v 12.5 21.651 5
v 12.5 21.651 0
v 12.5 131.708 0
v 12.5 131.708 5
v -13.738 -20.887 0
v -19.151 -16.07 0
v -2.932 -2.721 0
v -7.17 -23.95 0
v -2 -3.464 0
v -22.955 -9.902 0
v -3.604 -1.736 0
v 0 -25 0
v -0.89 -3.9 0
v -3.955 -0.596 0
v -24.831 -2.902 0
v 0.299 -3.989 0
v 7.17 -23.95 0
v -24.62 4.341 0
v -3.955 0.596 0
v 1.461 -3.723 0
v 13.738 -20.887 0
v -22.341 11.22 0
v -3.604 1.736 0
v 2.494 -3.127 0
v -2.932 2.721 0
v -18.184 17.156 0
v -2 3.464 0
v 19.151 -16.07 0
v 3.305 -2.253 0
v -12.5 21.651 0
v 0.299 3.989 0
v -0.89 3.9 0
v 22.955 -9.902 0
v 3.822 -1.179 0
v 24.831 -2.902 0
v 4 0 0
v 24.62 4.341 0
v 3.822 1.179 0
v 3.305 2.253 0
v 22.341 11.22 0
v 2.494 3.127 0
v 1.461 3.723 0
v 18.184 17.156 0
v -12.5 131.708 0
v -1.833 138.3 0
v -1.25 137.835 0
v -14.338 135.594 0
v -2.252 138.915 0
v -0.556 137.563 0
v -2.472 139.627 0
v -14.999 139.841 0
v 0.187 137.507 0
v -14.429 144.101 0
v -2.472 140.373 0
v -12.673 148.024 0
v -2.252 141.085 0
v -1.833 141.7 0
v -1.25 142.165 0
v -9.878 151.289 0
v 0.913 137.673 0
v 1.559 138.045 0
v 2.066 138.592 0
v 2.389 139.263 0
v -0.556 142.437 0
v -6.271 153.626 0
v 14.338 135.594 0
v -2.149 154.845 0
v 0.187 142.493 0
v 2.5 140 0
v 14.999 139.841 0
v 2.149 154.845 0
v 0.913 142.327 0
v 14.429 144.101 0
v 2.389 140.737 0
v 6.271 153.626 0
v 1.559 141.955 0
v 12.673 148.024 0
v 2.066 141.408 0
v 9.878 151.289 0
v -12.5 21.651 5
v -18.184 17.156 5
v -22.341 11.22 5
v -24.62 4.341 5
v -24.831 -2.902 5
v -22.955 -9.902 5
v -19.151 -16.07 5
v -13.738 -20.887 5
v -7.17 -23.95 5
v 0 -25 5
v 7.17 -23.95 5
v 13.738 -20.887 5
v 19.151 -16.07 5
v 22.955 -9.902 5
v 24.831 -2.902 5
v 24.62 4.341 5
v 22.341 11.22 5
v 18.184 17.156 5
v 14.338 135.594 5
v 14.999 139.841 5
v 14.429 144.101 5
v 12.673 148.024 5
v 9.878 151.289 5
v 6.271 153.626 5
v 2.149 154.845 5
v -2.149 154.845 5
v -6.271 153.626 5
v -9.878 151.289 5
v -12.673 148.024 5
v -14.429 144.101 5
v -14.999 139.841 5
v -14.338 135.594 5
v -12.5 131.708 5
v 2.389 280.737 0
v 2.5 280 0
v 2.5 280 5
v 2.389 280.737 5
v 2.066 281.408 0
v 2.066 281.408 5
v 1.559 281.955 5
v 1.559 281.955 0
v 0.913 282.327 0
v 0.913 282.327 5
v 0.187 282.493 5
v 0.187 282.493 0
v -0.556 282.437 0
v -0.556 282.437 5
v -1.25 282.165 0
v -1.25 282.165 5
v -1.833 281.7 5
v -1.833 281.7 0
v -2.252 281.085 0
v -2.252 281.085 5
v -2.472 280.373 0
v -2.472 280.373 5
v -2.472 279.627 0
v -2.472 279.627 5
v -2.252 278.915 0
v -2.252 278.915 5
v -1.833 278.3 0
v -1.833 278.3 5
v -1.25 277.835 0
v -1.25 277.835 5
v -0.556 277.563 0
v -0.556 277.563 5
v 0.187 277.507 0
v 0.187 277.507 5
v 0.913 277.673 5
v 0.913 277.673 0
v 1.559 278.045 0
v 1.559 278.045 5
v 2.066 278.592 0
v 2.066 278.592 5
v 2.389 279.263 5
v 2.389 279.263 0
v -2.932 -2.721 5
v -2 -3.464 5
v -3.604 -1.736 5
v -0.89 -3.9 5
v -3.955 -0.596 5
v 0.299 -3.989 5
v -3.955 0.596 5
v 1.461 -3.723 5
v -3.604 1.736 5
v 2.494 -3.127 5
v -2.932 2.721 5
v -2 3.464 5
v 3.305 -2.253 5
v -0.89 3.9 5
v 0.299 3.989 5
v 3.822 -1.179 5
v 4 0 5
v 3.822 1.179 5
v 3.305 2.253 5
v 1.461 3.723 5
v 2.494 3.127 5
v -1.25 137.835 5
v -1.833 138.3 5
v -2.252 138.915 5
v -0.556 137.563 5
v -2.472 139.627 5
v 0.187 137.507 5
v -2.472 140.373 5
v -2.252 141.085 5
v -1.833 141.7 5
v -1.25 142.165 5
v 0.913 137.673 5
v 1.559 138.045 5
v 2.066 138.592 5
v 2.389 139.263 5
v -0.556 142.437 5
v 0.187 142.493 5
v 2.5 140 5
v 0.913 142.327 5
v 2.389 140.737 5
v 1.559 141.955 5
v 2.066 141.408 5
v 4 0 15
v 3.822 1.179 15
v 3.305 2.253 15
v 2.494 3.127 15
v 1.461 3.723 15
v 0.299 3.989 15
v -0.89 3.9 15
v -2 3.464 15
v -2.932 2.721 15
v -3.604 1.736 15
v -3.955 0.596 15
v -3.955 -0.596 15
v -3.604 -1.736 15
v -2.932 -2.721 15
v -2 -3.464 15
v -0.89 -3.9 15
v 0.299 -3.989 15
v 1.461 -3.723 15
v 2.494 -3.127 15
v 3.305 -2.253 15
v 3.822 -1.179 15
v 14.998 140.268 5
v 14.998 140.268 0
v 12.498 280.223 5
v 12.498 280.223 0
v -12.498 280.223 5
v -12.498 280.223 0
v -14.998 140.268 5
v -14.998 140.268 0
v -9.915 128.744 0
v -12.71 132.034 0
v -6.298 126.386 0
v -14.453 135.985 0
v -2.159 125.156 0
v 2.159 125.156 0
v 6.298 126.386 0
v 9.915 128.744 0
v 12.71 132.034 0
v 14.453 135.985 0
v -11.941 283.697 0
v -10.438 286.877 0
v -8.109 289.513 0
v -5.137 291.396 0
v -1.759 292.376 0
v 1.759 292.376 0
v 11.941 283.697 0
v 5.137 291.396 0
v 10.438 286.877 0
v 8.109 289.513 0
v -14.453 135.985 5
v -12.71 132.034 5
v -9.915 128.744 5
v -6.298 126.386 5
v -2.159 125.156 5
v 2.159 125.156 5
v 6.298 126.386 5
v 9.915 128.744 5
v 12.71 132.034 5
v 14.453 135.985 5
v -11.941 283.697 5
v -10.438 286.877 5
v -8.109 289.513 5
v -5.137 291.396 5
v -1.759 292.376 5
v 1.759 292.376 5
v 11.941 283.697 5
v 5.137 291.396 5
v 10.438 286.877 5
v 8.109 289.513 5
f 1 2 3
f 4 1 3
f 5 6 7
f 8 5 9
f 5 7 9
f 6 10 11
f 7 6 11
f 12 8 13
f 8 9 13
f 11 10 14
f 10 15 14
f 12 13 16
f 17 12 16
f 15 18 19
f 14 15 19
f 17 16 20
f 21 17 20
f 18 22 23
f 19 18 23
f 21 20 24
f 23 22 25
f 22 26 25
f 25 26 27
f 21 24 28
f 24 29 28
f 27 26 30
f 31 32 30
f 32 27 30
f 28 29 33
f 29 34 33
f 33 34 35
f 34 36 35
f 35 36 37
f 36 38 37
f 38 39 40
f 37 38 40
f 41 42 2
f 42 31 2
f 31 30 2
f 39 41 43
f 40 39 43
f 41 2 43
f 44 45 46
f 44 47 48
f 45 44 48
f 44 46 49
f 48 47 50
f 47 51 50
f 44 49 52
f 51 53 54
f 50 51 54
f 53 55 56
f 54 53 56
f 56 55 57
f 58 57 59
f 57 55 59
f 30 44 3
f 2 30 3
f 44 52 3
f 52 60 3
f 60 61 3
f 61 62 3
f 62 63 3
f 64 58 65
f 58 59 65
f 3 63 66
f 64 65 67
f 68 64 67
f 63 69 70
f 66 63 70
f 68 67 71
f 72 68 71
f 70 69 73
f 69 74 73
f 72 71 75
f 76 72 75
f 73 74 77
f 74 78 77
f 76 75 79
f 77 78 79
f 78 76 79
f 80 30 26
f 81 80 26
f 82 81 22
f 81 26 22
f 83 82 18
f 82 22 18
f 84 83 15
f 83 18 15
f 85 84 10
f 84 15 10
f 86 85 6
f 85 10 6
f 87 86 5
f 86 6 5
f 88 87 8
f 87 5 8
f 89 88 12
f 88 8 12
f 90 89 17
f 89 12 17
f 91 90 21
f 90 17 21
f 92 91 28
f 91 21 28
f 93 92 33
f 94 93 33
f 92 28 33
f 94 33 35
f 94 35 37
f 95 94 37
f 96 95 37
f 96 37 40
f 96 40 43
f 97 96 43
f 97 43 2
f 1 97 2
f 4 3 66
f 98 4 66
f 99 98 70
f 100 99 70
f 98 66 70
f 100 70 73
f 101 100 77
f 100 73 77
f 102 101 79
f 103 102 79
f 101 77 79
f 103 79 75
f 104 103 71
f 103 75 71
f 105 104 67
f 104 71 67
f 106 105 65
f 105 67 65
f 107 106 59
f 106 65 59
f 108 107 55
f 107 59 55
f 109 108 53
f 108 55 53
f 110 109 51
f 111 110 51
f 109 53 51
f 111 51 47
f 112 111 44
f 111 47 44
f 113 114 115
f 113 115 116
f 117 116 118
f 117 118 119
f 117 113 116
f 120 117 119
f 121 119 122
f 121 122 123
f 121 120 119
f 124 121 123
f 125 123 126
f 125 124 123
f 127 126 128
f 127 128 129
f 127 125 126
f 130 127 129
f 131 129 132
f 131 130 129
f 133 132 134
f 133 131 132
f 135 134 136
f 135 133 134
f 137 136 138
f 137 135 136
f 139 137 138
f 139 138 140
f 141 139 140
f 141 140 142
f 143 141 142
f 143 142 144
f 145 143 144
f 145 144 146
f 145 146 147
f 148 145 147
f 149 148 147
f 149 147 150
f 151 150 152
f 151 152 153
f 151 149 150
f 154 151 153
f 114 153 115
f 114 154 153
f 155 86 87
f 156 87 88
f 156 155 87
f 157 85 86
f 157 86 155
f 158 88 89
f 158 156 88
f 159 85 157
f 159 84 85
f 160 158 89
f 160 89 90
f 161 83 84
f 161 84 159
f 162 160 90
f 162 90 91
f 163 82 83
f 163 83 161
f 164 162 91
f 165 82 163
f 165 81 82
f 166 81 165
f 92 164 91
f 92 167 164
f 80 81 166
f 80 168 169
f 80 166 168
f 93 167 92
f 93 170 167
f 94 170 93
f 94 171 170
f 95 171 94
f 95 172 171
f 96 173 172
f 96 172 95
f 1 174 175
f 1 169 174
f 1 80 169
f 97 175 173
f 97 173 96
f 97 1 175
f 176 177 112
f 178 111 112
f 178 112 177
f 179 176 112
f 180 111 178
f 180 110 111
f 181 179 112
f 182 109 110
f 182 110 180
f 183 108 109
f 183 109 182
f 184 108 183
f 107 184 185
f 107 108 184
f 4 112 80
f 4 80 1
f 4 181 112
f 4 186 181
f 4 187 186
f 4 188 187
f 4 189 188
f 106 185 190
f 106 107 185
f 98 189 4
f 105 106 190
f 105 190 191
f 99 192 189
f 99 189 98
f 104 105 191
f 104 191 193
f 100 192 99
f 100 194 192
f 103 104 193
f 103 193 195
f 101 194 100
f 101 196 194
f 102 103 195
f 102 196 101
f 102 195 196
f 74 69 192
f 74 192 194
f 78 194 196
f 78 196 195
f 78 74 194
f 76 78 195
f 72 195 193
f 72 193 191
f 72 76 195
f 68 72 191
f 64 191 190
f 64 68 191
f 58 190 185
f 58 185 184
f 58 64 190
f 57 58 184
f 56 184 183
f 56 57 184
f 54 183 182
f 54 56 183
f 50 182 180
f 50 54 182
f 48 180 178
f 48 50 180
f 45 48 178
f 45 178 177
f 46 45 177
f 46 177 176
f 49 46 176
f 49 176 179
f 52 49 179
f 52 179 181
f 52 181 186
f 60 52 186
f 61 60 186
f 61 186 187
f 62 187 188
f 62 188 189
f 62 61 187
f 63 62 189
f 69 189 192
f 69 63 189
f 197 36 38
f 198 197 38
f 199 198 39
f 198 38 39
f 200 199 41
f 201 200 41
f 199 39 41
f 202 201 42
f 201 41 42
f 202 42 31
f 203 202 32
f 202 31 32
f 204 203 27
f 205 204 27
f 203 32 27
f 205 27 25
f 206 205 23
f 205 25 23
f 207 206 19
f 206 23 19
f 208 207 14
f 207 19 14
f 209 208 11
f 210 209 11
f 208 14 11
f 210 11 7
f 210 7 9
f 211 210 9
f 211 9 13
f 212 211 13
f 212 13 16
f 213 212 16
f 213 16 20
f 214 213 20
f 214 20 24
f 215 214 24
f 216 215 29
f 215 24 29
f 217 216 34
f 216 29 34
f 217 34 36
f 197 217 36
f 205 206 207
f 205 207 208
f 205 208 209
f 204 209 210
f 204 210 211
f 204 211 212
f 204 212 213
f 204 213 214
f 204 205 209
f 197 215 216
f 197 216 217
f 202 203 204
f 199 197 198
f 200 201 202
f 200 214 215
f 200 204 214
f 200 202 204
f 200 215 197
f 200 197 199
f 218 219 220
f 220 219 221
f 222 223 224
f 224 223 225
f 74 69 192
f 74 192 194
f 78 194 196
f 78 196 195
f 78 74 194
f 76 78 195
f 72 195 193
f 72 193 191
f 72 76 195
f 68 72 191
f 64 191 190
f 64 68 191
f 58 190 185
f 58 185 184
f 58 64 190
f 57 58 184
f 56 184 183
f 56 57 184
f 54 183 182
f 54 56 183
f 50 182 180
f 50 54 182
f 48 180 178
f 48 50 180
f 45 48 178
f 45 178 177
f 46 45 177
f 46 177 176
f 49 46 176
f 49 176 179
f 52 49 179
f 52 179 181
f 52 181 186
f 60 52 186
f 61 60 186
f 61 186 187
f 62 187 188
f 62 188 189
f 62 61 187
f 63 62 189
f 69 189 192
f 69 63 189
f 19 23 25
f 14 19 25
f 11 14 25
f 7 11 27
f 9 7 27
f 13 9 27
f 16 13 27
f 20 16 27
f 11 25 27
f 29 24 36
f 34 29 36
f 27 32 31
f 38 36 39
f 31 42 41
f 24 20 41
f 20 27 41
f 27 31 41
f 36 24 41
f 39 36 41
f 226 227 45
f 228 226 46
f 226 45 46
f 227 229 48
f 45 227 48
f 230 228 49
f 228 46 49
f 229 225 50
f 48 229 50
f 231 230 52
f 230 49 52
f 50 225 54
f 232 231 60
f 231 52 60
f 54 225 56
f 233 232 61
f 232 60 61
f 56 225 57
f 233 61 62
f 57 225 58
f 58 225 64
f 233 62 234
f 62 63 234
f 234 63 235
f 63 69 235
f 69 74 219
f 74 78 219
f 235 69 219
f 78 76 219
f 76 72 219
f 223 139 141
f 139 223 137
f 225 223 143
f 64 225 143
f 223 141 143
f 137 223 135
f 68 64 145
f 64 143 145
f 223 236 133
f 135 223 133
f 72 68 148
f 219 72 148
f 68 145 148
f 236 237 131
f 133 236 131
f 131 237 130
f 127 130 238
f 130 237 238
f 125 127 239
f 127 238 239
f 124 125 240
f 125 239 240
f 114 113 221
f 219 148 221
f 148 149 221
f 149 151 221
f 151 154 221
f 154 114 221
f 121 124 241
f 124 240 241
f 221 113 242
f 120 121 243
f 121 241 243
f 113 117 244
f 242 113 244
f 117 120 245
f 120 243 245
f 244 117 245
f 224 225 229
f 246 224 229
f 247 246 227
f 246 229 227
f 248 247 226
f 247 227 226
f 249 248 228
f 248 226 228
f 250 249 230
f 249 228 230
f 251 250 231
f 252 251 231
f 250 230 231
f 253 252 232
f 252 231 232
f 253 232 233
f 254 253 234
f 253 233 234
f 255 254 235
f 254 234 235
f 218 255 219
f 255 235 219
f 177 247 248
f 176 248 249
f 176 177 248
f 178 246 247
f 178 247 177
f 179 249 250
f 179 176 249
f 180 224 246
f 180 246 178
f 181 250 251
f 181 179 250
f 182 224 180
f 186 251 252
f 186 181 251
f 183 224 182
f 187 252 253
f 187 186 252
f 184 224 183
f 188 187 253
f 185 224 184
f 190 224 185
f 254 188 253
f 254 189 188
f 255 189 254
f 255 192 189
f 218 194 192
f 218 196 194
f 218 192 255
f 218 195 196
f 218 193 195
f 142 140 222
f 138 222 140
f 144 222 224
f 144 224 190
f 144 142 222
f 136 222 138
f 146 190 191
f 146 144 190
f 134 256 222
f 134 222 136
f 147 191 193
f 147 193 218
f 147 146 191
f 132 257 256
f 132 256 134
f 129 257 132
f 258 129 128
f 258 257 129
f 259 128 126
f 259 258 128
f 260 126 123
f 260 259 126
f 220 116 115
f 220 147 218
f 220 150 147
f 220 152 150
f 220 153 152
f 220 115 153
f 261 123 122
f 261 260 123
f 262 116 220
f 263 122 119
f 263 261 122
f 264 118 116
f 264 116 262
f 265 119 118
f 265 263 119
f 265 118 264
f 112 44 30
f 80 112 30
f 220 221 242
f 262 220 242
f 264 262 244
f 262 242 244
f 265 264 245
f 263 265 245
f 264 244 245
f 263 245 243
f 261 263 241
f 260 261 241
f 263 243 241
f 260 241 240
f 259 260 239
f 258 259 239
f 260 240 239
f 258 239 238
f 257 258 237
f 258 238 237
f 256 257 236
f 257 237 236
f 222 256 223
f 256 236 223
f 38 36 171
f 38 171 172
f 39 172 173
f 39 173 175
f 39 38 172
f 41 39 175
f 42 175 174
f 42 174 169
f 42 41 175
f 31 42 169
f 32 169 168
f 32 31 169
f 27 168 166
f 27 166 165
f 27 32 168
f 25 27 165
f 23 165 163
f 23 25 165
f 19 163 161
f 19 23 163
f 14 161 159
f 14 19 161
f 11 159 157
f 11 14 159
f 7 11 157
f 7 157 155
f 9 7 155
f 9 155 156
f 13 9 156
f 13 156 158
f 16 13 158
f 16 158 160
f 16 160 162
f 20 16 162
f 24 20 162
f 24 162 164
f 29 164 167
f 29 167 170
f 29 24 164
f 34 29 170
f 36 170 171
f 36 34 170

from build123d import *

# Parameters (mm, degrees)
F0_R     = 4
F0_R_2   = 2.5
F1_DEPTH = 5
F2_R     = 2.5
F3_DEPTH = 5
F4_R     = 4
F5_DEPTH = 15


with BuildPart() as f1:
    # F0 (on Top) → F1 (new body)
    with BuildSketch(Plane.XY):
        with BuildLine():
            Line((-12.5, 131.708438), (-12.5, 21.650635))
            ThreePointArc((-12.5, 21.650635), (0, -25), (12.5, 21.650635))
            Line((12.5, 21.650635), (12.5, 131.708438))
            ThreePointArc((12.5, 131.708438), (0, 155), (-12.5, 131.708438))
        make_face()
        Circle(F0_R, mode=Mode.SUBTRACT)
        with Locations((0, 140)):
            Circle(F0_R_2, mode=Mode.SUBTRACT)
    extrude(amount=F1_DEPTH)


with BuildPart() as f3:
    # F2 (on Top) → F3 (new body)
    with BuildSketch(Plane.XY):
        with BuildLine():
            Line((-12.498007, 280.223214), (-14.997608, 140.267857))
            ThreePointArc((-14.997608, 140.267857), (0, 125), (14.997608, 140.267857))
            Line((14.997608, 140.267857), (12.498007, 280.223214))
            ThreePointArc((12.498007, 280.223214), (0, 292.5), (-12.498007, 280.223214))
        make_face()
        with Locations((0, 140)):
            Circle(F2_R, mode=Mode.SUBTRACT)
        with Locations((0, 280)):
            Circle(F2_R, mode=Mode.SUBTRACT)
    extrude(amount=F3_DEPTH)


with BuildPart() as f5:
    # F4 (on Top) → F5 (new body)
    with BuildSketch(Plane.XY):
        Circle(F4_R)
    extrude(amount=F5_DEPTH)


solid = Compound([f1.part, f3.part, f5.part])
